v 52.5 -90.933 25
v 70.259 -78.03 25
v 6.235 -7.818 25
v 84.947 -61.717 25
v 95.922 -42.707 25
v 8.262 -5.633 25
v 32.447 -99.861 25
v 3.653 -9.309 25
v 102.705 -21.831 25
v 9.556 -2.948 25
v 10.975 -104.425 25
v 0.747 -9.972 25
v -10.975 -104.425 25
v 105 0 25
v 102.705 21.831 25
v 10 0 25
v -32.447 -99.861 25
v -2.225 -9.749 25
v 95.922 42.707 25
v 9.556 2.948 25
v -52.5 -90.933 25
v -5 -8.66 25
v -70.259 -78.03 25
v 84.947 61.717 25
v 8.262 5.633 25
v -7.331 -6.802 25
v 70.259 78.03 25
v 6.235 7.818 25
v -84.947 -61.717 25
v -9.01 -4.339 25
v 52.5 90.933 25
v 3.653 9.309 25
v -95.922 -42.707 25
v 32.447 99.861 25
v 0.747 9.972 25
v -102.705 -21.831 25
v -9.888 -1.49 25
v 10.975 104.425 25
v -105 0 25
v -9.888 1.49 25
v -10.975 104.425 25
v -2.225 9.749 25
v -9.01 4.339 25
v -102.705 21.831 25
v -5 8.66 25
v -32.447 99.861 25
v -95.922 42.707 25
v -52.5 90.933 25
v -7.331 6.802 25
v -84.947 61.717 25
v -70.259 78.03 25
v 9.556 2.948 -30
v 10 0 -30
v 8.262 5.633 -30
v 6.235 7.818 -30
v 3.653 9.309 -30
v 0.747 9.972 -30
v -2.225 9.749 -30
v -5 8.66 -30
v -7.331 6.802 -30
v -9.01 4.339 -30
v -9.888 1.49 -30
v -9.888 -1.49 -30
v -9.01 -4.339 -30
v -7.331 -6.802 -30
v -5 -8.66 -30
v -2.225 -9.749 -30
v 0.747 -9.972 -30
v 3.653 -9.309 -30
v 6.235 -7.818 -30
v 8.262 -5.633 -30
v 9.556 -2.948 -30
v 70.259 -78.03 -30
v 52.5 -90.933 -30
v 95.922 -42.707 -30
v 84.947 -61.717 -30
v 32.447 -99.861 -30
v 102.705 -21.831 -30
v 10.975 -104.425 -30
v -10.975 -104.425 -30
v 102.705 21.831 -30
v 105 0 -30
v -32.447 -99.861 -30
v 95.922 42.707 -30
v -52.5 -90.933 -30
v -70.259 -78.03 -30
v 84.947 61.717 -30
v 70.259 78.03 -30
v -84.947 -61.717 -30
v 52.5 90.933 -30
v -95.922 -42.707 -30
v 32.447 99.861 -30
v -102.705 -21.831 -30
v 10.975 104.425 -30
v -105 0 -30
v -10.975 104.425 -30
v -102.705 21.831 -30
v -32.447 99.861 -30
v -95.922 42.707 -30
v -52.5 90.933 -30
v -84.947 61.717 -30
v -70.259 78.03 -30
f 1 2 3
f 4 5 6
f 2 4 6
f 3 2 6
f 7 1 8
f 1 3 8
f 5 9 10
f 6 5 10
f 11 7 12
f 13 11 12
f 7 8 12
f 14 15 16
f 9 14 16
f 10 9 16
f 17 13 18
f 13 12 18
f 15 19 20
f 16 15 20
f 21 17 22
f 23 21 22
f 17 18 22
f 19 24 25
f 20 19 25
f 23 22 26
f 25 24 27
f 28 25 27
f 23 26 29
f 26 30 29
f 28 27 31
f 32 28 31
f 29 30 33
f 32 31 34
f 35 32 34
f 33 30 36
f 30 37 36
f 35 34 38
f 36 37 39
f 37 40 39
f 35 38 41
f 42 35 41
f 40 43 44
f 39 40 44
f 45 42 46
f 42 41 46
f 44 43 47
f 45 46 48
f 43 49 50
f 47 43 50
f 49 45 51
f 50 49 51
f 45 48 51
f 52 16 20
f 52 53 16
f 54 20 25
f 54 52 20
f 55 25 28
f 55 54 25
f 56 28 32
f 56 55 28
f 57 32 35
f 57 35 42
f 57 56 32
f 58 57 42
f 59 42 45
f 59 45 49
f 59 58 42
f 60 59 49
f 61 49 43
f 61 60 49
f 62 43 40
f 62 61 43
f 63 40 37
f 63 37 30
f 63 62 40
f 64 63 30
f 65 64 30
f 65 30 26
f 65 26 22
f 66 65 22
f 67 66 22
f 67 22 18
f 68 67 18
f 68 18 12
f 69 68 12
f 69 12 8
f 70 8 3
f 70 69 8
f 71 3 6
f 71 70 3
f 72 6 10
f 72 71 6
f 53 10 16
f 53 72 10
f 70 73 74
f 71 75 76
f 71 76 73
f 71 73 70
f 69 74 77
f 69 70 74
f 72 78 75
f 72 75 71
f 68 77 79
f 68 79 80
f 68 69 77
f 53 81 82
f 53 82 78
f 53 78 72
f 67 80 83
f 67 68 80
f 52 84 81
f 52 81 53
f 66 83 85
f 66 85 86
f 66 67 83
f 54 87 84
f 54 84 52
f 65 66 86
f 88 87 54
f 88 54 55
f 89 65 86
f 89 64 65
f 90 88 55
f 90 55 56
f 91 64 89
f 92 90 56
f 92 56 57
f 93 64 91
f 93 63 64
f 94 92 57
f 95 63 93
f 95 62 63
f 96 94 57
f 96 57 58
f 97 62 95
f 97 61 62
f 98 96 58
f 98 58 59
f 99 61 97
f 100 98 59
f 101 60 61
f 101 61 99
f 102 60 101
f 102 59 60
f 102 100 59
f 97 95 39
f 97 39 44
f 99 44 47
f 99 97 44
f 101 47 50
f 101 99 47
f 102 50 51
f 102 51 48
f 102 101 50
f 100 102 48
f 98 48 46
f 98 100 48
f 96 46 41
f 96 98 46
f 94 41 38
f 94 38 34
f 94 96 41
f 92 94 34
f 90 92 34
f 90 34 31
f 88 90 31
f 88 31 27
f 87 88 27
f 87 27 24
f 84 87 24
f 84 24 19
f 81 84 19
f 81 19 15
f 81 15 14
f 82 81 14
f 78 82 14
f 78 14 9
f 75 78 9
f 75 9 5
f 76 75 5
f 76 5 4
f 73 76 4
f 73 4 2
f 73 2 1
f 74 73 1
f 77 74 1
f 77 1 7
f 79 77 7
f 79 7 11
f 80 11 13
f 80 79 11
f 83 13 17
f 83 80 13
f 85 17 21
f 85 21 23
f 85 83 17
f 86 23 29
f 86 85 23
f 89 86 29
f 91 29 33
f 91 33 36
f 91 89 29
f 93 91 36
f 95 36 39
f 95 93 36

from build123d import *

# Parameters (mm, degrees)
SKETCH1_R                = 88
BOSS_EXTRUDE3_DEPTH      = 25
SKETCH4_W                = 10.4719
SKETCH4_H                = 13.351164338
BOSS_EXTRUDE4_DEPTH      = 25
FILLET2_R                = 4
CIRPATTERN1_COUNT        = 30
FILLET2_OF_CIRPATTERN1_R = 4
SKETCH6_R                = 10
BOSS_EXTRUDE5_DEPTH      = 60
BOSS_EXTRUDE6_START      = 10
SKETCH7_R                = 10
BOSS_EXTRUDE6_DEPTH      = 10
SKETCH8_R                = 10
BOSS_EXTRUDE7_DEPTH      = 10
SKETCH9_R                = 10
BOSS_EXTRUDE8_DEPTH      = 25
SKETCH10_R               = 10
BOSS_EXTRUDE9_DEPTH      = 42.5
SKETCH12_R               = 12.5
CUT_EXTRUDE1_DEPTH       = 12
CUT_EXTRUDE2_START       = -55.5
SKETCH13_R               = 10
CUT_EXTRUDE2_DEPTH       = 55.5
SKETCH14_R               = 10
BOSS_EXTRUDE10_DEPTH     = 440
SKETCH15_R               = 105
BOSS_EXTRUDE12_DEPTH     = 25
BOSS_EXTRUDE13_START     = 30
SKETCH16_R               = 105
BOSS_EXTRUDE13_DEPTH     = 30
SKETCH17_R               = 10
BOSS_EXTRUDE14_DEPTH     = 50
CUT_EXTRUDE3_START       = -700
SKETCH18_R               = 10
CUT_EXTRUDE3_DEPTH       = 700


with BuildPart() as part:
    # Sketch1 → Boss-Extrude3 (new body)
    with BuildSketch(Plane.XY):
        Circle(SKETCH1_R)
    extrude(amount=BOSS_EXTRUDE3_DEPTH)

    # Sketch4 → Boss-Extrude4 (add)
    with BuildSketch(Plane.XY.offset(25)):
        with Locations((0, 93.324417831)):
            Rectangle(SKETCH4_W, SKETCH4_H)
    boss_extrude4 = extrude(amount=-BOSS_EXTRUDE4_DEPTH)

    # Fillet2
    fillet2_edges = [part.edges().sort_by_distance(p)[0] for p in [
        (5.23595, 100, 12.5),
        (0, 100, 0),
        (-5.23595, 100, 12.5),
        (0, 100, 25),
    ]]
    fillet(fillet2_edges, radius=FILLET2_R)

    # CirPattern1: Boss-Extrude4 ×30 about axis
    cirpattern1_axis = Axis((0, 0.317667884, 0), (0, 0, 1))
    for i in range(1, CIRPATTERN1_COUNT):
        add(boss_extrude4.rotate(cirpattern1_axis, i * 360 / CIRPATTERN1_COUNT))

    # Fillet2 of CirPattern1
    fillet2_of_cirpattern1_edges = [part.edges().sort_by_distance(p)[0] for p in [
        (-15.603590285, 98.910317096, 12.5),
        (-20.725122215, 97.821701879, 0),
        (-25.846654145, 96.733086661, 12.5),
        (-20.725122215, 97.821701879, 25),
        (-35.7611788, 93.511662322, 12.5),
        (-40.544457139, 91.382009596, 0),
        (-45.327735478, 89.252356869, 12.5),
        (-40.544457139, 91.382009596, 25),
        (-54.3558322, 84.039982796, 12.5),
        (-58.591804732, 80.962368605, 0),
        (-62.827777264, 77.884754413, 12.5),
        (-58.591804732, 80.962368605, 25),
        (-70.574874905, 70.909236365, 12.5),
        (-74.078409304, 67.018167216, 0),
        (-77.581943702, 63.127098067, 12.5),
        (-74.078409304, 67.018167216, 25),
        (-83.709456921, 54.693299655, 12.5),
        (-86.327431921, 50.158833942, 0),
        (-88.945406921, 45.624368229, 12.5),
        (-86.327431921, 50.158833942, 25),
        (-93.185533987, 36.100886913, 12.5),
        (-94.803531519, 31.121202547, 0),
        (-96.42152905, 26.14151818, 12.5),
        (-94.803531519, 31.121202547, 25),
        (-98.588956064, 15.944575793, 12.5),
        (-99.136261871, 10.737308875, 0),
        (-99.683567678, 5.530041957, 12.5),
        (-99.136261871, 10.737308875, 25),
        (-99.683567678, -4.894706189, 12.5),
        (-99.136261871, -10.101973107, 0),
        (-98.588956064, -15.309240025, 12.5),
        (-99.136261871, -10.101973107, 25),
        (-96.42152905, -25.506182413, 12.5),
        (-94.803531519, -30.485866779, 0),
        (-93.185533987, -35.465551145, 12.5),
        (-94.803531519, -30.485866779, 25),
        (-88.945406921, -44.989032461, 12.5),
        (-86.327431921, -49.523498174, 0),
        (-83.709456921, -54.057963887, 12.5),
        (-86.327431921, -49.523498174, 25),
        (-77.581943702, -62.491762299, 12.5),
        (-74.078409304, -66.382831448, 0),
        (-70.574874905, -70.273900597, 12.5),
        (-74.078409304, -66.382831448, 25),
        (-62.827777264, -77.249418645, 12.5),
        (-58.591804732, -80.327032837, 0),
        (-54.3558322, -83.404647029, 12.5),
        (-58.591804732, -80.327032837, 25),
        (-45.327735478, -88.617021102, 12.5),
        (-40.544457139, -90.746673828, 0),
        (-35.7611788, -92.876326554, 12.5),
        (-40.544457139, -90.746673828, 25),
        (-25.846654145, -96.097750894, 12.5),
        (-20.725122215, -97.186366111, 0),
        (-15.603590285, -98.274981329, 12.5),
        (-20.725122215, -97.186366111, 25),
        (-5.23595, -99.364664232, 12.5),
        (0, -99.364664232, 0),
        (5.23595, -99.364664232, 12.5),
        (0, -99.364664232, 25),
        (15.603590285, -98.274981329, 12.5),
        (20.725122215, -97.186366111, 0),
        (25.846654145, -96.097750894, 12.5),
        (20.725122215, -97.186366111, 25),
        (35.7611788, -92.876326554, 12.5),
        (40.544457139, -90.746673828, 0),
        (45.327735478, -88.617021102, 12.5),
        (40.544457139, -90.746673828, 25),
        (54.3558322, -83.404647029, 12.5),
        (58.591804732, -80.327032837, 0),
        (62.827777264, -77.249418645, 12.5),
        (58.591804732, -80.327032837, 25),
        (70.574874905, -70.273900597, 12.5),
        (74.078409304, -66.382831448, 0),
        (77.581943702, -62.491762299, 12.5),
        (74.078409304, -66.382831448, 25),
        (83.709456921, -54.057963887, 12.5),
        (86.327431921, -49.523498174, 0),
        (88.945406921, -44.989032461, 12.5),
        (86.327431921, -49.523498174, 25),
        (93.185533987, -35.465551145, 12.5),
        (94.803531519, -30.485866779, 0),
        (96.42152905, -25.506182413, 12.5),
        (94.803531519, -30.485866779, 25),
        (98.588956064, -15.309240025, 12.5),
        (99.136261871, -10.101973107, 0),
        (99.683567678, -4.894706189, 12.5),
        (99.136261871, -10.101973107, 25),
        (99.683567678, 5.530041957, 12.5),
        (99.136261871, 10.737308875, 0),
        (98.588956064, 15.944575793, 12.5),
        (99.136261871, 10.737308875, 25),
        (96.42152905, 26.14151818, 12.5),
        (94.803531519, 31.121202547, 0),
        (93.185533987, 36.100886913, 12.5),
        (94.803531519, 31.121202547, 25),
        (88.945406921, 45.624368229, 12.5),
        (86.327431921, 50.158833942, 0),
        (83.709456921, 54.693299655, 12.5),
        (86.327431921, 50.158833942, 25),
        (77.581943702, 63.127098067, 12.5),
        (74.078409304, 67.018167216, 0),
        (70.574874905, 70.909236365, 12.5),
        (74.078409304, 67.018167216, 25),
        (62.827777264, 77.884754413, 12.5),
        (58.591804732, 80.962368605, 0),
        (54.3558322, 84.039982796, 12.5),
        (58.591804732, 80.962368605, 25),
        (45.327735478, 89.252356869, 12.5),
        (40.544457139, 91.382009596, 0),
        (35.7611788, 93.511662322, 12.5),
        (40.544457139, 91.382009596, 25),
        (25.846654145, 96.733086661, 12.5),
        (20.725122215, 97.821701879, 0),
        (15.603590285, 98.910317096, 12.5),
        (20.725122215, 97.821701879, 25),
    ]]
    fillet(fillet2_of_cirpattern1_edges, radius=FILLET2_OF_CIRPATTERN1_R)

    # Sketch6 → Boss-Extrude5 (add)
    with BuildSketch(Plane.XY.offset(25)):
        Circle(SKETCH6_R)
    extrude(amount=BOSS_EXTRUDE5_DEPTH)

    # Sketch7 → Boss-Extrude6 (add)
    with BuildSketch(Plane(origin=(0, 0, 0), x_dir=(-1, 0, 0), z_dir=(0, 0, -1)).offset(BOSS_EXTRUDE6_START)):
        with Locations(Location((0, 0, 0), (0, 0, 180))):
            Circle(SKETCH7_R)
    extrude(amount=-BOSS_EXTRUDE6_DEPTH)

    # Sketch8 → Boss-Extrude7 (add)
    with BuildSketch(Plane.XY.offset(85)):
        Circle(SKETCH8_R)
    extrude(amount=BOSS_EXTRUDE7_DEPTH)

    # Sketch9 → Boss-Extrude8 (add)
    with BuildSketch(Plane.XY.offset(95)):
        Circle(SKETCH9_R)
    extrude(amount=BOSS_EXTRUDE8_DEPTH)

    # Sketch10 → Boss-Extrude9 (add)
    with BuildSketch(Plane.XY.offset(120)):
        Circle(SKETCH10_R)
    extrude(amount=BOSS_EXTRUDE9_DEPTH)

    # Sketch12 → Cut-Extrude1 (cut)
    with BuildSketch(Plane.XY.offset(162.5)):
        Circle(SKETCH12_R)
    extrude(amount=-CUT_EXTRUDE1_DEPTH, mode=Mode.SUBTRACT)

    # Sketch13 → Cut-Extrude2 (cut)
    with BuildSketch(Plane.XY.offset(150.5).offset(CUT_EXTRUDE2_START)):
        Circle(SKETCH13_R)
    extrude(amount=CUT_EXTRUDE2_DEPTH, mode=Mode.SUBTRACT)

    # Sketch14 → Boss-Extrude10 (add)
    with BuildSketch(Plane.XY.offset(95)):
        Circle(SKETCH14_R)
    extrude(amount=BOSS_EXTRUDE10_DEPTH)

    # Sketch15 → Boss-Extrude12 (add)
    with BuildSketch(Plane(origin=(0, 0, 0), x_dir=(-1, 0, 0), z_dir=(0, 0, -1))):
        Circle(SKETCH15_R)
    extrude(amount=-BOSS_EXTRUDE12_DEPTH)

    # Sketch16 → Boss-Extrude13 (add)
    with BuildSketch(Plane(origin=(0, 0, 0), x_dir=(-1, 0, 0), z_dir=(0, 0, -1)).offset(BOSS_EXTRUDE13_START)):
        Circle(SKETCH16_R)
    extrude(amount=-BOSS_EXTRUDE13_DEPTH)

    # Sketch17 → Boss-Extrude14 (add)
    with BuildSketch(Plane.XY.offset(535)):
        Circle(SKETCH17_R)
    extrude(amount=BOSS_EXTRUDE14_DEPTH)

    # Sketch18 → Cut-Extrude3 (cut)
    with BuildSketch(Plane.XY.offset(585).offset(CUT_EXTRUDE3_START)):
        Circle(SKETCH18_R)
    extrude(amount=CUT_EXTRUDE3_DEPTH, mode=Mode.SUBTRACT)


solid = part.part
